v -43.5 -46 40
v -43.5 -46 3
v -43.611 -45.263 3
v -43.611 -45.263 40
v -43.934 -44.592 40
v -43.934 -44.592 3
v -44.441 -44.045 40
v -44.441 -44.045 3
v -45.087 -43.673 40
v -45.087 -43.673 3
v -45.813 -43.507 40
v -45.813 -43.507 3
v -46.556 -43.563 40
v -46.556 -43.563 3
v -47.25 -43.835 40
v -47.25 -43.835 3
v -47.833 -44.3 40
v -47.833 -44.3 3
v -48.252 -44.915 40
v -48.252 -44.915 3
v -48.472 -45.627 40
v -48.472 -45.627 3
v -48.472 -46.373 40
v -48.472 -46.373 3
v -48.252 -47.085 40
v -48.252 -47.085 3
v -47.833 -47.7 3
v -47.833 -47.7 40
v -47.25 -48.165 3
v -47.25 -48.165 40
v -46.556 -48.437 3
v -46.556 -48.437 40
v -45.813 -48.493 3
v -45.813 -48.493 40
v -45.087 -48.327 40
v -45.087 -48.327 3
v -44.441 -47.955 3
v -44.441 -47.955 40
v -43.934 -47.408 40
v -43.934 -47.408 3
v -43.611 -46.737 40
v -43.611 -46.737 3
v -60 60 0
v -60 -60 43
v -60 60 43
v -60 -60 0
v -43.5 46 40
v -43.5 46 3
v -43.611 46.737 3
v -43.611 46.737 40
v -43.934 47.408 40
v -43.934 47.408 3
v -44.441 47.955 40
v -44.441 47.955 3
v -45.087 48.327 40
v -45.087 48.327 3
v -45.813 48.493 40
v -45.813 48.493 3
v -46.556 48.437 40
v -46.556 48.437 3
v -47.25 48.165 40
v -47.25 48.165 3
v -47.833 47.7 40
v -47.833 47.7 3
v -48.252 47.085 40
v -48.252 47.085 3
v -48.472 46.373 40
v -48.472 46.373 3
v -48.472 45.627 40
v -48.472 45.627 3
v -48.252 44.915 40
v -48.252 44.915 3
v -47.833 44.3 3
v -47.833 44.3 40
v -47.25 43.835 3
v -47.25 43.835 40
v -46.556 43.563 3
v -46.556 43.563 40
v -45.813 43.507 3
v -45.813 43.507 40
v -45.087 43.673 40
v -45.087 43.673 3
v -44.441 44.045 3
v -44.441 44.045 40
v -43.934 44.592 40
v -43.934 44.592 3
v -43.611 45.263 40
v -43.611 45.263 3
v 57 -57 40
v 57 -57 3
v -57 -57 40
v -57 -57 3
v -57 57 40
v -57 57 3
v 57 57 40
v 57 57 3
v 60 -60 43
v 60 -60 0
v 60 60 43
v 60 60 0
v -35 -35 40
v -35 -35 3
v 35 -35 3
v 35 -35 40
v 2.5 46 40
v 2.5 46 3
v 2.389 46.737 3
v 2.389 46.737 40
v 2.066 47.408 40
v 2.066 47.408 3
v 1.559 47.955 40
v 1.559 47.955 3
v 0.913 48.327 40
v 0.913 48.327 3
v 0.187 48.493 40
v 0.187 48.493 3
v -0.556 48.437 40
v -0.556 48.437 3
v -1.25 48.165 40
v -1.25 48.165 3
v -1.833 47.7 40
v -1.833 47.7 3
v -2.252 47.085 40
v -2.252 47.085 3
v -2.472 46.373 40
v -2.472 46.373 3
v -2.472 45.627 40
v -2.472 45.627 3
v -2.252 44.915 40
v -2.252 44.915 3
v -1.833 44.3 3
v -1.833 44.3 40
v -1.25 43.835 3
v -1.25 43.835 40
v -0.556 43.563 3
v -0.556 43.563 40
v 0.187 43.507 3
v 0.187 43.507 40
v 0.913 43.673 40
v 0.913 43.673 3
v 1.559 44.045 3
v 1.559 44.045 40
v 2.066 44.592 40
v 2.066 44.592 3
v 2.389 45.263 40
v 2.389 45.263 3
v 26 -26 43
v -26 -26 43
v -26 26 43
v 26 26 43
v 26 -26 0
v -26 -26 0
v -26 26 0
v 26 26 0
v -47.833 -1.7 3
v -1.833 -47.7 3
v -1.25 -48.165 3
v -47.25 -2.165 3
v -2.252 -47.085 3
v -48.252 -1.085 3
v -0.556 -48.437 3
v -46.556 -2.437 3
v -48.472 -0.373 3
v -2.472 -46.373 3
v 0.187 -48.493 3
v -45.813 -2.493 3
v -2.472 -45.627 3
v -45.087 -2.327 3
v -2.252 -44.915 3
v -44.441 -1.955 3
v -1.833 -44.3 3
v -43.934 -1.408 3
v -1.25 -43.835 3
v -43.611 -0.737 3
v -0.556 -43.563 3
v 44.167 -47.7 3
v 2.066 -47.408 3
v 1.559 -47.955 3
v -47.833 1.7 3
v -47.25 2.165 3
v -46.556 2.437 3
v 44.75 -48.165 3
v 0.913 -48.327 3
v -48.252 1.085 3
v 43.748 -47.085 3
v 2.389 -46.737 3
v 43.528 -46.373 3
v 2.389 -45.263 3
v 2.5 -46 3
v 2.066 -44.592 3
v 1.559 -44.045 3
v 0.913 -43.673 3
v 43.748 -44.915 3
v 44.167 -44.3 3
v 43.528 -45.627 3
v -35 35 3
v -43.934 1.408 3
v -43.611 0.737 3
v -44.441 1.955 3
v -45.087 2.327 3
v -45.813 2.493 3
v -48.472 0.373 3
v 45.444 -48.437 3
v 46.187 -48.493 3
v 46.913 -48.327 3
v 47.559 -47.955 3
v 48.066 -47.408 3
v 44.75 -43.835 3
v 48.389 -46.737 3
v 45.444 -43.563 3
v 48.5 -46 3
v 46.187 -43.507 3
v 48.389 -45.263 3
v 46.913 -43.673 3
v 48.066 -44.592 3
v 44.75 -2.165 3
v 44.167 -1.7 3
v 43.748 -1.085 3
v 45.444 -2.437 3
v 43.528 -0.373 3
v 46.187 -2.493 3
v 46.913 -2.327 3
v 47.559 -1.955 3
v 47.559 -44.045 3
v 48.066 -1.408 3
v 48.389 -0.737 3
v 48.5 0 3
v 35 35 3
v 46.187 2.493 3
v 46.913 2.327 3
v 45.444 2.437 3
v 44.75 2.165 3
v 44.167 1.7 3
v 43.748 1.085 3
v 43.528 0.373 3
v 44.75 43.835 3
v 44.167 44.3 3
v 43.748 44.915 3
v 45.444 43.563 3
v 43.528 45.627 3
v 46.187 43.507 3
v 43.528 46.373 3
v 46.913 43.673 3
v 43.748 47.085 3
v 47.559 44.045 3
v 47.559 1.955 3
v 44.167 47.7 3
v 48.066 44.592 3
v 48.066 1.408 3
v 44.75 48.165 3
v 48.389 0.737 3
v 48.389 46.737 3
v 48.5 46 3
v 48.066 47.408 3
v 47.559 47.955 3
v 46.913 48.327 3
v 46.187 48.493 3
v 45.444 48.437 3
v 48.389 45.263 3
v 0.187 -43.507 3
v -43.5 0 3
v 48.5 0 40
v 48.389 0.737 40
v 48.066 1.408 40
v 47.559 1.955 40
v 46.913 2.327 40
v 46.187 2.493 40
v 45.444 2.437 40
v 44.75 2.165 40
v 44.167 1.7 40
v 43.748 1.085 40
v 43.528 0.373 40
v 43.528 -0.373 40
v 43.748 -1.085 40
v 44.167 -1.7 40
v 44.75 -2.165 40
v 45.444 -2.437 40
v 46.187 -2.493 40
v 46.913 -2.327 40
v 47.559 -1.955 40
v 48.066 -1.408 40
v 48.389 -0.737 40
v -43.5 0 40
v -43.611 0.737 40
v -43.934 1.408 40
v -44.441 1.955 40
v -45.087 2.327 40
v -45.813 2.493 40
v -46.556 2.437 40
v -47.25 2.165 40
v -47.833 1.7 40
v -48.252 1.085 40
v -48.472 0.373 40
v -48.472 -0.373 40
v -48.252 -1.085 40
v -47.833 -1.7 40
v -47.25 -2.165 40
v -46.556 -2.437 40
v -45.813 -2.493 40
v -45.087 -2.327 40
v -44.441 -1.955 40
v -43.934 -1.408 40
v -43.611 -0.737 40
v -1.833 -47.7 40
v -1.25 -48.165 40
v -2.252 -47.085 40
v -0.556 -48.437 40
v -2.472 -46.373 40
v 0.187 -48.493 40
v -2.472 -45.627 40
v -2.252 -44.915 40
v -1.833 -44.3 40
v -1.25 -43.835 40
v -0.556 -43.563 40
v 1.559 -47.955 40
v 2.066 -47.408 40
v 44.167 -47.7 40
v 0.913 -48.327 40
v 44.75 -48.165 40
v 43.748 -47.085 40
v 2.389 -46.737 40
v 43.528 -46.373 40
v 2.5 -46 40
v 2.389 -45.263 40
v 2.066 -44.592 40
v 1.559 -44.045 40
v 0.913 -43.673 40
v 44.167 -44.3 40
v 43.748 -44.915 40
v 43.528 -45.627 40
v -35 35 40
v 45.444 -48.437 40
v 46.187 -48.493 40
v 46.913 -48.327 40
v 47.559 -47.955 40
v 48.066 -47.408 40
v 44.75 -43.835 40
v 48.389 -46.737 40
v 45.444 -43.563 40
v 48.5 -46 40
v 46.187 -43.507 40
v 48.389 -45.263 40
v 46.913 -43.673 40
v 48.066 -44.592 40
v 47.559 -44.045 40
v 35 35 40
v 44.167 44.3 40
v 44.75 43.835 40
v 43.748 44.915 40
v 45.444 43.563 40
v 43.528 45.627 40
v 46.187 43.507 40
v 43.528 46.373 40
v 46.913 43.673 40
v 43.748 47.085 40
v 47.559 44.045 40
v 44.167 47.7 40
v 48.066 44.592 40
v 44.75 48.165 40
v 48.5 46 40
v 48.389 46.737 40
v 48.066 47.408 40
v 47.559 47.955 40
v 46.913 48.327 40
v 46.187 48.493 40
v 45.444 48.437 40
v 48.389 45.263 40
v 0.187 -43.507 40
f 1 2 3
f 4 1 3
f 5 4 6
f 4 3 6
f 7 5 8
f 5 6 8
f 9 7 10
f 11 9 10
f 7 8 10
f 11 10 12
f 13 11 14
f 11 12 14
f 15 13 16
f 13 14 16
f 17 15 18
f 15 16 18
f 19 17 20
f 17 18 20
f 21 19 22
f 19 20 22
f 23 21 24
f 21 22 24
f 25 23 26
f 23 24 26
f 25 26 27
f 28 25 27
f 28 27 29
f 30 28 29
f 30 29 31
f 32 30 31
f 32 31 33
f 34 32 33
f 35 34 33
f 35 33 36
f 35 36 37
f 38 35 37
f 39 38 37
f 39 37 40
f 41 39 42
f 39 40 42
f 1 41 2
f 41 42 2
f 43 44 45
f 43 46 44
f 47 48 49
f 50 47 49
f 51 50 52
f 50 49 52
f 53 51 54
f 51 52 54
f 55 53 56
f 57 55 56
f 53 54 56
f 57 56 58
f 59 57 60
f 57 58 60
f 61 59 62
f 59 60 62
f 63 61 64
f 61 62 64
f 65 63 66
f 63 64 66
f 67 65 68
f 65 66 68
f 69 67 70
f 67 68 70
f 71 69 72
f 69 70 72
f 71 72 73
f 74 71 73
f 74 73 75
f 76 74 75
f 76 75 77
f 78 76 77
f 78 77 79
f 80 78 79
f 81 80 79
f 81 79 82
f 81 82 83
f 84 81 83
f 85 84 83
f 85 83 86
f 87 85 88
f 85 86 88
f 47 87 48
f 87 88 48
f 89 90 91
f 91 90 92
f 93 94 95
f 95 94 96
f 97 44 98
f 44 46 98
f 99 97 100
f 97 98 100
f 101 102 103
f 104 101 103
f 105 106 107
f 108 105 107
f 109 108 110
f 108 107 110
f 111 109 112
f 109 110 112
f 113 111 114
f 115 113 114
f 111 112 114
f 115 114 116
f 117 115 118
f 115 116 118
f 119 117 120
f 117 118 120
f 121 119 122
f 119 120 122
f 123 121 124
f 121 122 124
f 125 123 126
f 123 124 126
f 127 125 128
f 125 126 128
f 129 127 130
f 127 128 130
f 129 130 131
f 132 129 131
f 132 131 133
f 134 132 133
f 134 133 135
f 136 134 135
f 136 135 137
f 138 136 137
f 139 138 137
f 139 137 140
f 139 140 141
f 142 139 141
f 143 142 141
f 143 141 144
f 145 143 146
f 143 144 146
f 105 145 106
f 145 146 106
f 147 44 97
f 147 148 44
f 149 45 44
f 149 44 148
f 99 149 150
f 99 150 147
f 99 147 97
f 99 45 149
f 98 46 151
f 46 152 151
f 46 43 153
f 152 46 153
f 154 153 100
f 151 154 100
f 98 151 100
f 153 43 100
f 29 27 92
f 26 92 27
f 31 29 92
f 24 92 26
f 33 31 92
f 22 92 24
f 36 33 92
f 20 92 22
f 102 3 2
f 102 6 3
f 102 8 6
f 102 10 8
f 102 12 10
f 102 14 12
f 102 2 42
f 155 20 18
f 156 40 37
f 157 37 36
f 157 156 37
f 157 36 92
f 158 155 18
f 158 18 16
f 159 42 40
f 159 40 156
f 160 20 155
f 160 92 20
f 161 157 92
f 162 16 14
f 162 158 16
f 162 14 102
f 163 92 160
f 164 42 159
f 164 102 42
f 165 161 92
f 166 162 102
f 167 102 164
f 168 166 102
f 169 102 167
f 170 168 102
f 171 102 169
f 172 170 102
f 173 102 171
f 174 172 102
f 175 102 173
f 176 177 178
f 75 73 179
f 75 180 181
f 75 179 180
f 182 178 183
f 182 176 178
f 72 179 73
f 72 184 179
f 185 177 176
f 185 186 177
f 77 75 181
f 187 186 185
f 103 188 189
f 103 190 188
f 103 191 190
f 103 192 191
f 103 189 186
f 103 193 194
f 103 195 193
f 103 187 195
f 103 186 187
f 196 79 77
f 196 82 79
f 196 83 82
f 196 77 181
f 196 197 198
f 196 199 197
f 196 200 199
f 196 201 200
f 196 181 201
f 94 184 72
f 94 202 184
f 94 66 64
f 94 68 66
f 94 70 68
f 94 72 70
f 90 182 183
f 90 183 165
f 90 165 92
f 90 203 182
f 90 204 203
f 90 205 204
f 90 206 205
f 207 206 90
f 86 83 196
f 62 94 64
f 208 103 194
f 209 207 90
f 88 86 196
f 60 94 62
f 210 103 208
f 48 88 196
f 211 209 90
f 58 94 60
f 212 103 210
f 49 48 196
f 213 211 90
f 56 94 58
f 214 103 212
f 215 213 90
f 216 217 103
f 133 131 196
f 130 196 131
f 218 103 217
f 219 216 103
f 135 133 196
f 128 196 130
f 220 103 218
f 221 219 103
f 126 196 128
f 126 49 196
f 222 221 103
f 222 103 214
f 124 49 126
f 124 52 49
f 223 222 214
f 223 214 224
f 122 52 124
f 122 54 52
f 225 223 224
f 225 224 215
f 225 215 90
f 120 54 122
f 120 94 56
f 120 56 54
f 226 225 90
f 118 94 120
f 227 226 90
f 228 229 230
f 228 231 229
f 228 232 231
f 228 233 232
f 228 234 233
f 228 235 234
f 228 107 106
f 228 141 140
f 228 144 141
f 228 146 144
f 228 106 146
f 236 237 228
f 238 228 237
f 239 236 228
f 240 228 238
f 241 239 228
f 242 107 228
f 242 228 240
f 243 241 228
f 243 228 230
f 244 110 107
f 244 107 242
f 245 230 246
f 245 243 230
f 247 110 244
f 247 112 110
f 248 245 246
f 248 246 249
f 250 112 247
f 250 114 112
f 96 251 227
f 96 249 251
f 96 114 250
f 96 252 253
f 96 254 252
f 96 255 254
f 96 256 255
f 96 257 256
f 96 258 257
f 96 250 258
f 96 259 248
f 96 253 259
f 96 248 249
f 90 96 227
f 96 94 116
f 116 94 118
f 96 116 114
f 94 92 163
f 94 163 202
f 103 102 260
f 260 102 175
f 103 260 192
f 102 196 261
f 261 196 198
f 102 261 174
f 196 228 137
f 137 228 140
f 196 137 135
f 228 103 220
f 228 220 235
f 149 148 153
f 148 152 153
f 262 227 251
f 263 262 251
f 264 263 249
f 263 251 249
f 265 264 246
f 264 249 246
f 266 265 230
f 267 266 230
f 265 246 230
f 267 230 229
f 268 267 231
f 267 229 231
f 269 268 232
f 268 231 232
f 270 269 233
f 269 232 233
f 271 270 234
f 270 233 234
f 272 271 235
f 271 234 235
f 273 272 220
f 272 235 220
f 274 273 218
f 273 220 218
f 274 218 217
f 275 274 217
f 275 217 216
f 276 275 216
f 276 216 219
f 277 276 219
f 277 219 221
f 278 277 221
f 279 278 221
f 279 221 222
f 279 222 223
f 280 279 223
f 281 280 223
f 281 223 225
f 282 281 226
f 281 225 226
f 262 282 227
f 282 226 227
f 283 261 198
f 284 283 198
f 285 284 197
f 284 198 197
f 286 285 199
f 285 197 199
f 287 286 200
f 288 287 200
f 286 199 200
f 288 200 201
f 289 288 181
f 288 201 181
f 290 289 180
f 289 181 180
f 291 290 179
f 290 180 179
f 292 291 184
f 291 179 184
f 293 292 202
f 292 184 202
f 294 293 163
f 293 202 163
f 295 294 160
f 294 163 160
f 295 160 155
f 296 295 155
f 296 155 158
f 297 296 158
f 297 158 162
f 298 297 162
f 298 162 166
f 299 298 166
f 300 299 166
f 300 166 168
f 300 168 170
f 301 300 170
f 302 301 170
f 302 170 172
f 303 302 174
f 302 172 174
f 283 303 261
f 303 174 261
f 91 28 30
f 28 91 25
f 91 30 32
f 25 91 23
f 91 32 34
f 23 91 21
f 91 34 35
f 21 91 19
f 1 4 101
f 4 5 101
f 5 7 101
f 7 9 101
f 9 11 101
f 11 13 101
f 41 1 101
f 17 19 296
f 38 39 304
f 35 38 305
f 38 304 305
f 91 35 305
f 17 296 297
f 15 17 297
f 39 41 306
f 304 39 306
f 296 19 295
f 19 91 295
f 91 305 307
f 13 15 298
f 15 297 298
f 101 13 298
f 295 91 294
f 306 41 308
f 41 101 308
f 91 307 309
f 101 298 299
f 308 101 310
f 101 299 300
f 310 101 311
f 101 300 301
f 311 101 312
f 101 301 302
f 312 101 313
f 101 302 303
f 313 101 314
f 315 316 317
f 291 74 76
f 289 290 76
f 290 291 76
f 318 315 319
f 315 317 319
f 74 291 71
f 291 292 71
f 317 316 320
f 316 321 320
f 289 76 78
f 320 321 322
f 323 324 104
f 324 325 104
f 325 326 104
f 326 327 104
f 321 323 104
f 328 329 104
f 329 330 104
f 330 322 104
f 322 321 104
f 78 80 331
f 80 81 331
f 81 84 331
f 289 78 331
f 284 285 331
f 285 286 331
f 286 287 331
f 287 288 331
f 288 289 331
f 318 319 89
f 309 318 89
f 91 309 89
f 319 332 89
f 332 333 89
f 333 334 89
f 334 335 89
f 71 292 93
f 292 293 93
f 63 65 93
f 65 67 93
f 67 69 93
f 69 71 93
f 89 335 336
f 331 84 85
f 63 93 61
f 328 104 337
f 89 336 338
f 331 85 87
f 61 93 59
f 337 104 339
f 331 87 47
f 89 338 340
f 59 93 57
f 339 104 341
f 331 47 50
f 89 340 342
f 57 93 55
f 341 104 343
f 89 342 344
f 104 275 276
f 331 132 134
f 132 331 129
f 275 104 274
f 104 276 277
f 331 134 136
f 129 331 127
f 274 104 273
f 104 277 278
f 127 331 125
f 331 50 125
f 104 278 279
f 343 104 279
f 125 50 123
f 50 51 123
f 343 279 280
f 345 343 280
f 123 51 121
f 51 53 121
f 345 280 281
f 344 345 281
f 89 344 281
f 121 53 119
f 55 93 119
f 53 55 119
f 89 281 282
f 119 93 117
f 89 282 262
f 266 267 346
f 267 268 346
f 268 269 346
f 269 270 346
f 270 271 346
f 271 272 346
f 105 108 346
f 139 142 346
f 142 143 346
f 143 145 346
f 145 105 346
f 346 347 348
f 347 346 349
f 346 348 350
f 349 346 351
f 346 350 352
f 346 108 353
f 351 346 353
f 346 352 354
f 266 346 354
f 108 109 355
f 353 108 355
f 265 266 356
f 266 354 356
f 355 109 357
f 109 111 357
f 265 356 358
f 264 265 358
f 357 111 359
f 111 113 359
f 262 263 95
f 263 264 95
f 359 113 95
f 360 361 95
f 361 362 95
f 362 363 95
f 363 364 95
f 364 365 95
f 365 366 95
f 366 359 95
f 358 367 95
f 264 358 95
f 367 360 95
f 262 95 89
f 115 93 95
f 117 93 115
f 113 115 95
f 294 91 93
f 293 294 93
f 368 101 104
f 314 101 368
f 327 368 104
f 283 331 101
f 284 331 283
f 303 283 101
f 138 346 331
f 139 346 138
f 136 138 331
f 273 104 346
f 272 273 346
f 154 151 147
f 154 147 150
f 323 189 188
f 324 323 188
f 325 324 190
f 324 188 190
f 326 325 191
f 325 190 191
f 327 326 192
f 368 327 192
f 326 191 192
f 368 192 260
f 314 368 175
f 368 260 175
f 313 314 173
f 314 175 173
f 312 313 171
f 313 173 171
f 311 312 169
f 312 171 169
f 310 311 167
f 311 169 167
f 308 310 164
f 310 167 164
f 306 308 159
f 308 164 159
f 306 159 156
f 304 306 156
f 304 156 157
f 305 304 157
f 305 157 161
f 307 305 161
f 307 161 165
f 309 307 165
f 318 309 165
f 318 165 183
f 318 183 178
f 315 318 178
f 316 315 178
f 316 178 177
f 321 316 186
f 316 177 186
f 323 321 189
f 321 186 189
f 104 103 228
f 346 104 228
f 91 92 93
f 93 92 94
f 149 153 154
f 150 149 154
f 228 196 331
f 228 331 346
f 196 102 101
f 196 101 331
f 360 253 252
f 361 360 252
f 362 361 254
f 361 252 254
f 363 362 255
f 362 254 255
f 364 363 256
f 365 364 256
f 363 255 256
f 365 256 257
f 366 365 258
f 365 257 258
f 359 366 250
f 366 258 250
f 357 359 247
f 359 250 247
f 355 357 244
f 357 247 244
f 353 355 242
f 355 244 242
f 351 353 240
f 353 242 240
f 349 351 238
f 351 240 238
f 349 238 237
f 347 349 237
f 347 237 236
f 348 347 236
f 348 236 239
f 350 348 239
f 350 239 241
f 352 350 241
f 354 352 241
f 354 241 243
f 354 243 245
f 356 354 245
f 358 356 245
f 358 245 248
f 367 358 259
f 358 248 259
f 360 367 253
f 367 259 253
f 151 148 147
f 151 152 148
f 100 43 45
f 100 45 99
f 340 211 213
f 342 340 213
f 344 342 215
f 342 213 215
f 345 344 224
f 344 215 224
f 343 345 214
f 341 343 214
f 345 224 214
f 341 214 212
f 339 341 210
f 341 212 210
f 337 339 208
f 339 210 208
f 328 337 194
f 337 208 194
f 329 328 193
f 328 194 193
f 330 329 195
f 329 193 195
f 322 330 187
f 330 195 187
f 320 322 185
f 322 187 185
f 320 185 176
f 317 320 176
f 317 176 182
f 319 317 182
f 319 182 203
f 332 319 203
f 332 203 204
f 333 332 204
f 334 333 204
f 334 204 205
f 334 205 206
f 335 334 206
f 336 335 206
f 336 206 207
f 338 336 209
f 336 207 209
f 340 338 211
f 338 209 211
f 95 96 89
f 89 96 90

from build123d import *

# Parameters (mm, degrees)
F0_W     = 120
F0_H     = 120
F1_DEPTH = 3
F2_W     = 52
F2_H     = 52
F3_DEPTH = 25
F2_W_2   = 120
F2_H_2   = 120
F2_W_3   = 70
F2_H_3   = 70
F2_R     = 2.5
F4_DEPTH = 37
F5_W     = 120
F5_H     = 120
F5_W_2   = 114
F5_H_2   = 114
F5_W_3   = 52
F5_H_3   = 52
F6_DEPTH = 3


with BuildPart() as f1:
    # F0 (on Top) → F1 (new body)
    with BuildSketch(Plane.XY):
        Rectangle(F0_W, F0_H)
    extrude(amount=F1_DEPTH)

    # F2 (on face) → F3 (cut)
    with BuildSketch(Plane.XY.offset(3)):
        Rectangle(F2_W, F2_H)
    extrude(amount=-F3_DEPTH, mode=Mode.SUBTRACT)

    # F2 (on face) → F4 (join)
    with BuildSketch(Plane.XY.offset(3)):
        Rectangle(F2_W_2, F2_H_2)
        Polygon((-57, -57), (-57, -35), (-57, 35), (-57, 57), (-35, 57), (35, 57), (57, 57), (57, 35), (57, -35), (57, -57), (35, -57), (-35, -57), align=None, mode=Mode.SUBTRACT)
        Rectangle(F2_W_3, F2_H_3)
        Rectangle(F2_W, F2_H, mode=Mode.SUBTRACT)
        with Locations((46, 46)):
            Circle(F2_R)
        with Locations((0, 46)):
            Circle(F2_R)
        with Locations((-46, 46)):
            Circle(F2_R)
        with Locations((-46, 0)):
            Circle(F2_R)
        with Locations((-46, -46)):
            Circle(F2_R)
        with Locations((0, -46)):
            Circle(F2_R)
        with Locations((46, -46)):
            Circle(F2_R)
        with Locations((46, 0)):
            Circle(F2_R)
    extrude(amount=F4_DEPTH)

    # F5 (on face) → F6 (join)
    with BuildSketch(Plane.XY.offset(40)):
        Rectangle(F5_W, F5_H)
        Rectangle(F5_W_2, F5_H_2, mode=Mode.SUBTRACT)
        Rectangle(F5_W_2, F5_H_2)
        Rectangle(F5_W_3, F5_H_3, mode=Mode.SUBTRACT)
    extrude(amount=F6_DEPTH)


solid = f1.part
